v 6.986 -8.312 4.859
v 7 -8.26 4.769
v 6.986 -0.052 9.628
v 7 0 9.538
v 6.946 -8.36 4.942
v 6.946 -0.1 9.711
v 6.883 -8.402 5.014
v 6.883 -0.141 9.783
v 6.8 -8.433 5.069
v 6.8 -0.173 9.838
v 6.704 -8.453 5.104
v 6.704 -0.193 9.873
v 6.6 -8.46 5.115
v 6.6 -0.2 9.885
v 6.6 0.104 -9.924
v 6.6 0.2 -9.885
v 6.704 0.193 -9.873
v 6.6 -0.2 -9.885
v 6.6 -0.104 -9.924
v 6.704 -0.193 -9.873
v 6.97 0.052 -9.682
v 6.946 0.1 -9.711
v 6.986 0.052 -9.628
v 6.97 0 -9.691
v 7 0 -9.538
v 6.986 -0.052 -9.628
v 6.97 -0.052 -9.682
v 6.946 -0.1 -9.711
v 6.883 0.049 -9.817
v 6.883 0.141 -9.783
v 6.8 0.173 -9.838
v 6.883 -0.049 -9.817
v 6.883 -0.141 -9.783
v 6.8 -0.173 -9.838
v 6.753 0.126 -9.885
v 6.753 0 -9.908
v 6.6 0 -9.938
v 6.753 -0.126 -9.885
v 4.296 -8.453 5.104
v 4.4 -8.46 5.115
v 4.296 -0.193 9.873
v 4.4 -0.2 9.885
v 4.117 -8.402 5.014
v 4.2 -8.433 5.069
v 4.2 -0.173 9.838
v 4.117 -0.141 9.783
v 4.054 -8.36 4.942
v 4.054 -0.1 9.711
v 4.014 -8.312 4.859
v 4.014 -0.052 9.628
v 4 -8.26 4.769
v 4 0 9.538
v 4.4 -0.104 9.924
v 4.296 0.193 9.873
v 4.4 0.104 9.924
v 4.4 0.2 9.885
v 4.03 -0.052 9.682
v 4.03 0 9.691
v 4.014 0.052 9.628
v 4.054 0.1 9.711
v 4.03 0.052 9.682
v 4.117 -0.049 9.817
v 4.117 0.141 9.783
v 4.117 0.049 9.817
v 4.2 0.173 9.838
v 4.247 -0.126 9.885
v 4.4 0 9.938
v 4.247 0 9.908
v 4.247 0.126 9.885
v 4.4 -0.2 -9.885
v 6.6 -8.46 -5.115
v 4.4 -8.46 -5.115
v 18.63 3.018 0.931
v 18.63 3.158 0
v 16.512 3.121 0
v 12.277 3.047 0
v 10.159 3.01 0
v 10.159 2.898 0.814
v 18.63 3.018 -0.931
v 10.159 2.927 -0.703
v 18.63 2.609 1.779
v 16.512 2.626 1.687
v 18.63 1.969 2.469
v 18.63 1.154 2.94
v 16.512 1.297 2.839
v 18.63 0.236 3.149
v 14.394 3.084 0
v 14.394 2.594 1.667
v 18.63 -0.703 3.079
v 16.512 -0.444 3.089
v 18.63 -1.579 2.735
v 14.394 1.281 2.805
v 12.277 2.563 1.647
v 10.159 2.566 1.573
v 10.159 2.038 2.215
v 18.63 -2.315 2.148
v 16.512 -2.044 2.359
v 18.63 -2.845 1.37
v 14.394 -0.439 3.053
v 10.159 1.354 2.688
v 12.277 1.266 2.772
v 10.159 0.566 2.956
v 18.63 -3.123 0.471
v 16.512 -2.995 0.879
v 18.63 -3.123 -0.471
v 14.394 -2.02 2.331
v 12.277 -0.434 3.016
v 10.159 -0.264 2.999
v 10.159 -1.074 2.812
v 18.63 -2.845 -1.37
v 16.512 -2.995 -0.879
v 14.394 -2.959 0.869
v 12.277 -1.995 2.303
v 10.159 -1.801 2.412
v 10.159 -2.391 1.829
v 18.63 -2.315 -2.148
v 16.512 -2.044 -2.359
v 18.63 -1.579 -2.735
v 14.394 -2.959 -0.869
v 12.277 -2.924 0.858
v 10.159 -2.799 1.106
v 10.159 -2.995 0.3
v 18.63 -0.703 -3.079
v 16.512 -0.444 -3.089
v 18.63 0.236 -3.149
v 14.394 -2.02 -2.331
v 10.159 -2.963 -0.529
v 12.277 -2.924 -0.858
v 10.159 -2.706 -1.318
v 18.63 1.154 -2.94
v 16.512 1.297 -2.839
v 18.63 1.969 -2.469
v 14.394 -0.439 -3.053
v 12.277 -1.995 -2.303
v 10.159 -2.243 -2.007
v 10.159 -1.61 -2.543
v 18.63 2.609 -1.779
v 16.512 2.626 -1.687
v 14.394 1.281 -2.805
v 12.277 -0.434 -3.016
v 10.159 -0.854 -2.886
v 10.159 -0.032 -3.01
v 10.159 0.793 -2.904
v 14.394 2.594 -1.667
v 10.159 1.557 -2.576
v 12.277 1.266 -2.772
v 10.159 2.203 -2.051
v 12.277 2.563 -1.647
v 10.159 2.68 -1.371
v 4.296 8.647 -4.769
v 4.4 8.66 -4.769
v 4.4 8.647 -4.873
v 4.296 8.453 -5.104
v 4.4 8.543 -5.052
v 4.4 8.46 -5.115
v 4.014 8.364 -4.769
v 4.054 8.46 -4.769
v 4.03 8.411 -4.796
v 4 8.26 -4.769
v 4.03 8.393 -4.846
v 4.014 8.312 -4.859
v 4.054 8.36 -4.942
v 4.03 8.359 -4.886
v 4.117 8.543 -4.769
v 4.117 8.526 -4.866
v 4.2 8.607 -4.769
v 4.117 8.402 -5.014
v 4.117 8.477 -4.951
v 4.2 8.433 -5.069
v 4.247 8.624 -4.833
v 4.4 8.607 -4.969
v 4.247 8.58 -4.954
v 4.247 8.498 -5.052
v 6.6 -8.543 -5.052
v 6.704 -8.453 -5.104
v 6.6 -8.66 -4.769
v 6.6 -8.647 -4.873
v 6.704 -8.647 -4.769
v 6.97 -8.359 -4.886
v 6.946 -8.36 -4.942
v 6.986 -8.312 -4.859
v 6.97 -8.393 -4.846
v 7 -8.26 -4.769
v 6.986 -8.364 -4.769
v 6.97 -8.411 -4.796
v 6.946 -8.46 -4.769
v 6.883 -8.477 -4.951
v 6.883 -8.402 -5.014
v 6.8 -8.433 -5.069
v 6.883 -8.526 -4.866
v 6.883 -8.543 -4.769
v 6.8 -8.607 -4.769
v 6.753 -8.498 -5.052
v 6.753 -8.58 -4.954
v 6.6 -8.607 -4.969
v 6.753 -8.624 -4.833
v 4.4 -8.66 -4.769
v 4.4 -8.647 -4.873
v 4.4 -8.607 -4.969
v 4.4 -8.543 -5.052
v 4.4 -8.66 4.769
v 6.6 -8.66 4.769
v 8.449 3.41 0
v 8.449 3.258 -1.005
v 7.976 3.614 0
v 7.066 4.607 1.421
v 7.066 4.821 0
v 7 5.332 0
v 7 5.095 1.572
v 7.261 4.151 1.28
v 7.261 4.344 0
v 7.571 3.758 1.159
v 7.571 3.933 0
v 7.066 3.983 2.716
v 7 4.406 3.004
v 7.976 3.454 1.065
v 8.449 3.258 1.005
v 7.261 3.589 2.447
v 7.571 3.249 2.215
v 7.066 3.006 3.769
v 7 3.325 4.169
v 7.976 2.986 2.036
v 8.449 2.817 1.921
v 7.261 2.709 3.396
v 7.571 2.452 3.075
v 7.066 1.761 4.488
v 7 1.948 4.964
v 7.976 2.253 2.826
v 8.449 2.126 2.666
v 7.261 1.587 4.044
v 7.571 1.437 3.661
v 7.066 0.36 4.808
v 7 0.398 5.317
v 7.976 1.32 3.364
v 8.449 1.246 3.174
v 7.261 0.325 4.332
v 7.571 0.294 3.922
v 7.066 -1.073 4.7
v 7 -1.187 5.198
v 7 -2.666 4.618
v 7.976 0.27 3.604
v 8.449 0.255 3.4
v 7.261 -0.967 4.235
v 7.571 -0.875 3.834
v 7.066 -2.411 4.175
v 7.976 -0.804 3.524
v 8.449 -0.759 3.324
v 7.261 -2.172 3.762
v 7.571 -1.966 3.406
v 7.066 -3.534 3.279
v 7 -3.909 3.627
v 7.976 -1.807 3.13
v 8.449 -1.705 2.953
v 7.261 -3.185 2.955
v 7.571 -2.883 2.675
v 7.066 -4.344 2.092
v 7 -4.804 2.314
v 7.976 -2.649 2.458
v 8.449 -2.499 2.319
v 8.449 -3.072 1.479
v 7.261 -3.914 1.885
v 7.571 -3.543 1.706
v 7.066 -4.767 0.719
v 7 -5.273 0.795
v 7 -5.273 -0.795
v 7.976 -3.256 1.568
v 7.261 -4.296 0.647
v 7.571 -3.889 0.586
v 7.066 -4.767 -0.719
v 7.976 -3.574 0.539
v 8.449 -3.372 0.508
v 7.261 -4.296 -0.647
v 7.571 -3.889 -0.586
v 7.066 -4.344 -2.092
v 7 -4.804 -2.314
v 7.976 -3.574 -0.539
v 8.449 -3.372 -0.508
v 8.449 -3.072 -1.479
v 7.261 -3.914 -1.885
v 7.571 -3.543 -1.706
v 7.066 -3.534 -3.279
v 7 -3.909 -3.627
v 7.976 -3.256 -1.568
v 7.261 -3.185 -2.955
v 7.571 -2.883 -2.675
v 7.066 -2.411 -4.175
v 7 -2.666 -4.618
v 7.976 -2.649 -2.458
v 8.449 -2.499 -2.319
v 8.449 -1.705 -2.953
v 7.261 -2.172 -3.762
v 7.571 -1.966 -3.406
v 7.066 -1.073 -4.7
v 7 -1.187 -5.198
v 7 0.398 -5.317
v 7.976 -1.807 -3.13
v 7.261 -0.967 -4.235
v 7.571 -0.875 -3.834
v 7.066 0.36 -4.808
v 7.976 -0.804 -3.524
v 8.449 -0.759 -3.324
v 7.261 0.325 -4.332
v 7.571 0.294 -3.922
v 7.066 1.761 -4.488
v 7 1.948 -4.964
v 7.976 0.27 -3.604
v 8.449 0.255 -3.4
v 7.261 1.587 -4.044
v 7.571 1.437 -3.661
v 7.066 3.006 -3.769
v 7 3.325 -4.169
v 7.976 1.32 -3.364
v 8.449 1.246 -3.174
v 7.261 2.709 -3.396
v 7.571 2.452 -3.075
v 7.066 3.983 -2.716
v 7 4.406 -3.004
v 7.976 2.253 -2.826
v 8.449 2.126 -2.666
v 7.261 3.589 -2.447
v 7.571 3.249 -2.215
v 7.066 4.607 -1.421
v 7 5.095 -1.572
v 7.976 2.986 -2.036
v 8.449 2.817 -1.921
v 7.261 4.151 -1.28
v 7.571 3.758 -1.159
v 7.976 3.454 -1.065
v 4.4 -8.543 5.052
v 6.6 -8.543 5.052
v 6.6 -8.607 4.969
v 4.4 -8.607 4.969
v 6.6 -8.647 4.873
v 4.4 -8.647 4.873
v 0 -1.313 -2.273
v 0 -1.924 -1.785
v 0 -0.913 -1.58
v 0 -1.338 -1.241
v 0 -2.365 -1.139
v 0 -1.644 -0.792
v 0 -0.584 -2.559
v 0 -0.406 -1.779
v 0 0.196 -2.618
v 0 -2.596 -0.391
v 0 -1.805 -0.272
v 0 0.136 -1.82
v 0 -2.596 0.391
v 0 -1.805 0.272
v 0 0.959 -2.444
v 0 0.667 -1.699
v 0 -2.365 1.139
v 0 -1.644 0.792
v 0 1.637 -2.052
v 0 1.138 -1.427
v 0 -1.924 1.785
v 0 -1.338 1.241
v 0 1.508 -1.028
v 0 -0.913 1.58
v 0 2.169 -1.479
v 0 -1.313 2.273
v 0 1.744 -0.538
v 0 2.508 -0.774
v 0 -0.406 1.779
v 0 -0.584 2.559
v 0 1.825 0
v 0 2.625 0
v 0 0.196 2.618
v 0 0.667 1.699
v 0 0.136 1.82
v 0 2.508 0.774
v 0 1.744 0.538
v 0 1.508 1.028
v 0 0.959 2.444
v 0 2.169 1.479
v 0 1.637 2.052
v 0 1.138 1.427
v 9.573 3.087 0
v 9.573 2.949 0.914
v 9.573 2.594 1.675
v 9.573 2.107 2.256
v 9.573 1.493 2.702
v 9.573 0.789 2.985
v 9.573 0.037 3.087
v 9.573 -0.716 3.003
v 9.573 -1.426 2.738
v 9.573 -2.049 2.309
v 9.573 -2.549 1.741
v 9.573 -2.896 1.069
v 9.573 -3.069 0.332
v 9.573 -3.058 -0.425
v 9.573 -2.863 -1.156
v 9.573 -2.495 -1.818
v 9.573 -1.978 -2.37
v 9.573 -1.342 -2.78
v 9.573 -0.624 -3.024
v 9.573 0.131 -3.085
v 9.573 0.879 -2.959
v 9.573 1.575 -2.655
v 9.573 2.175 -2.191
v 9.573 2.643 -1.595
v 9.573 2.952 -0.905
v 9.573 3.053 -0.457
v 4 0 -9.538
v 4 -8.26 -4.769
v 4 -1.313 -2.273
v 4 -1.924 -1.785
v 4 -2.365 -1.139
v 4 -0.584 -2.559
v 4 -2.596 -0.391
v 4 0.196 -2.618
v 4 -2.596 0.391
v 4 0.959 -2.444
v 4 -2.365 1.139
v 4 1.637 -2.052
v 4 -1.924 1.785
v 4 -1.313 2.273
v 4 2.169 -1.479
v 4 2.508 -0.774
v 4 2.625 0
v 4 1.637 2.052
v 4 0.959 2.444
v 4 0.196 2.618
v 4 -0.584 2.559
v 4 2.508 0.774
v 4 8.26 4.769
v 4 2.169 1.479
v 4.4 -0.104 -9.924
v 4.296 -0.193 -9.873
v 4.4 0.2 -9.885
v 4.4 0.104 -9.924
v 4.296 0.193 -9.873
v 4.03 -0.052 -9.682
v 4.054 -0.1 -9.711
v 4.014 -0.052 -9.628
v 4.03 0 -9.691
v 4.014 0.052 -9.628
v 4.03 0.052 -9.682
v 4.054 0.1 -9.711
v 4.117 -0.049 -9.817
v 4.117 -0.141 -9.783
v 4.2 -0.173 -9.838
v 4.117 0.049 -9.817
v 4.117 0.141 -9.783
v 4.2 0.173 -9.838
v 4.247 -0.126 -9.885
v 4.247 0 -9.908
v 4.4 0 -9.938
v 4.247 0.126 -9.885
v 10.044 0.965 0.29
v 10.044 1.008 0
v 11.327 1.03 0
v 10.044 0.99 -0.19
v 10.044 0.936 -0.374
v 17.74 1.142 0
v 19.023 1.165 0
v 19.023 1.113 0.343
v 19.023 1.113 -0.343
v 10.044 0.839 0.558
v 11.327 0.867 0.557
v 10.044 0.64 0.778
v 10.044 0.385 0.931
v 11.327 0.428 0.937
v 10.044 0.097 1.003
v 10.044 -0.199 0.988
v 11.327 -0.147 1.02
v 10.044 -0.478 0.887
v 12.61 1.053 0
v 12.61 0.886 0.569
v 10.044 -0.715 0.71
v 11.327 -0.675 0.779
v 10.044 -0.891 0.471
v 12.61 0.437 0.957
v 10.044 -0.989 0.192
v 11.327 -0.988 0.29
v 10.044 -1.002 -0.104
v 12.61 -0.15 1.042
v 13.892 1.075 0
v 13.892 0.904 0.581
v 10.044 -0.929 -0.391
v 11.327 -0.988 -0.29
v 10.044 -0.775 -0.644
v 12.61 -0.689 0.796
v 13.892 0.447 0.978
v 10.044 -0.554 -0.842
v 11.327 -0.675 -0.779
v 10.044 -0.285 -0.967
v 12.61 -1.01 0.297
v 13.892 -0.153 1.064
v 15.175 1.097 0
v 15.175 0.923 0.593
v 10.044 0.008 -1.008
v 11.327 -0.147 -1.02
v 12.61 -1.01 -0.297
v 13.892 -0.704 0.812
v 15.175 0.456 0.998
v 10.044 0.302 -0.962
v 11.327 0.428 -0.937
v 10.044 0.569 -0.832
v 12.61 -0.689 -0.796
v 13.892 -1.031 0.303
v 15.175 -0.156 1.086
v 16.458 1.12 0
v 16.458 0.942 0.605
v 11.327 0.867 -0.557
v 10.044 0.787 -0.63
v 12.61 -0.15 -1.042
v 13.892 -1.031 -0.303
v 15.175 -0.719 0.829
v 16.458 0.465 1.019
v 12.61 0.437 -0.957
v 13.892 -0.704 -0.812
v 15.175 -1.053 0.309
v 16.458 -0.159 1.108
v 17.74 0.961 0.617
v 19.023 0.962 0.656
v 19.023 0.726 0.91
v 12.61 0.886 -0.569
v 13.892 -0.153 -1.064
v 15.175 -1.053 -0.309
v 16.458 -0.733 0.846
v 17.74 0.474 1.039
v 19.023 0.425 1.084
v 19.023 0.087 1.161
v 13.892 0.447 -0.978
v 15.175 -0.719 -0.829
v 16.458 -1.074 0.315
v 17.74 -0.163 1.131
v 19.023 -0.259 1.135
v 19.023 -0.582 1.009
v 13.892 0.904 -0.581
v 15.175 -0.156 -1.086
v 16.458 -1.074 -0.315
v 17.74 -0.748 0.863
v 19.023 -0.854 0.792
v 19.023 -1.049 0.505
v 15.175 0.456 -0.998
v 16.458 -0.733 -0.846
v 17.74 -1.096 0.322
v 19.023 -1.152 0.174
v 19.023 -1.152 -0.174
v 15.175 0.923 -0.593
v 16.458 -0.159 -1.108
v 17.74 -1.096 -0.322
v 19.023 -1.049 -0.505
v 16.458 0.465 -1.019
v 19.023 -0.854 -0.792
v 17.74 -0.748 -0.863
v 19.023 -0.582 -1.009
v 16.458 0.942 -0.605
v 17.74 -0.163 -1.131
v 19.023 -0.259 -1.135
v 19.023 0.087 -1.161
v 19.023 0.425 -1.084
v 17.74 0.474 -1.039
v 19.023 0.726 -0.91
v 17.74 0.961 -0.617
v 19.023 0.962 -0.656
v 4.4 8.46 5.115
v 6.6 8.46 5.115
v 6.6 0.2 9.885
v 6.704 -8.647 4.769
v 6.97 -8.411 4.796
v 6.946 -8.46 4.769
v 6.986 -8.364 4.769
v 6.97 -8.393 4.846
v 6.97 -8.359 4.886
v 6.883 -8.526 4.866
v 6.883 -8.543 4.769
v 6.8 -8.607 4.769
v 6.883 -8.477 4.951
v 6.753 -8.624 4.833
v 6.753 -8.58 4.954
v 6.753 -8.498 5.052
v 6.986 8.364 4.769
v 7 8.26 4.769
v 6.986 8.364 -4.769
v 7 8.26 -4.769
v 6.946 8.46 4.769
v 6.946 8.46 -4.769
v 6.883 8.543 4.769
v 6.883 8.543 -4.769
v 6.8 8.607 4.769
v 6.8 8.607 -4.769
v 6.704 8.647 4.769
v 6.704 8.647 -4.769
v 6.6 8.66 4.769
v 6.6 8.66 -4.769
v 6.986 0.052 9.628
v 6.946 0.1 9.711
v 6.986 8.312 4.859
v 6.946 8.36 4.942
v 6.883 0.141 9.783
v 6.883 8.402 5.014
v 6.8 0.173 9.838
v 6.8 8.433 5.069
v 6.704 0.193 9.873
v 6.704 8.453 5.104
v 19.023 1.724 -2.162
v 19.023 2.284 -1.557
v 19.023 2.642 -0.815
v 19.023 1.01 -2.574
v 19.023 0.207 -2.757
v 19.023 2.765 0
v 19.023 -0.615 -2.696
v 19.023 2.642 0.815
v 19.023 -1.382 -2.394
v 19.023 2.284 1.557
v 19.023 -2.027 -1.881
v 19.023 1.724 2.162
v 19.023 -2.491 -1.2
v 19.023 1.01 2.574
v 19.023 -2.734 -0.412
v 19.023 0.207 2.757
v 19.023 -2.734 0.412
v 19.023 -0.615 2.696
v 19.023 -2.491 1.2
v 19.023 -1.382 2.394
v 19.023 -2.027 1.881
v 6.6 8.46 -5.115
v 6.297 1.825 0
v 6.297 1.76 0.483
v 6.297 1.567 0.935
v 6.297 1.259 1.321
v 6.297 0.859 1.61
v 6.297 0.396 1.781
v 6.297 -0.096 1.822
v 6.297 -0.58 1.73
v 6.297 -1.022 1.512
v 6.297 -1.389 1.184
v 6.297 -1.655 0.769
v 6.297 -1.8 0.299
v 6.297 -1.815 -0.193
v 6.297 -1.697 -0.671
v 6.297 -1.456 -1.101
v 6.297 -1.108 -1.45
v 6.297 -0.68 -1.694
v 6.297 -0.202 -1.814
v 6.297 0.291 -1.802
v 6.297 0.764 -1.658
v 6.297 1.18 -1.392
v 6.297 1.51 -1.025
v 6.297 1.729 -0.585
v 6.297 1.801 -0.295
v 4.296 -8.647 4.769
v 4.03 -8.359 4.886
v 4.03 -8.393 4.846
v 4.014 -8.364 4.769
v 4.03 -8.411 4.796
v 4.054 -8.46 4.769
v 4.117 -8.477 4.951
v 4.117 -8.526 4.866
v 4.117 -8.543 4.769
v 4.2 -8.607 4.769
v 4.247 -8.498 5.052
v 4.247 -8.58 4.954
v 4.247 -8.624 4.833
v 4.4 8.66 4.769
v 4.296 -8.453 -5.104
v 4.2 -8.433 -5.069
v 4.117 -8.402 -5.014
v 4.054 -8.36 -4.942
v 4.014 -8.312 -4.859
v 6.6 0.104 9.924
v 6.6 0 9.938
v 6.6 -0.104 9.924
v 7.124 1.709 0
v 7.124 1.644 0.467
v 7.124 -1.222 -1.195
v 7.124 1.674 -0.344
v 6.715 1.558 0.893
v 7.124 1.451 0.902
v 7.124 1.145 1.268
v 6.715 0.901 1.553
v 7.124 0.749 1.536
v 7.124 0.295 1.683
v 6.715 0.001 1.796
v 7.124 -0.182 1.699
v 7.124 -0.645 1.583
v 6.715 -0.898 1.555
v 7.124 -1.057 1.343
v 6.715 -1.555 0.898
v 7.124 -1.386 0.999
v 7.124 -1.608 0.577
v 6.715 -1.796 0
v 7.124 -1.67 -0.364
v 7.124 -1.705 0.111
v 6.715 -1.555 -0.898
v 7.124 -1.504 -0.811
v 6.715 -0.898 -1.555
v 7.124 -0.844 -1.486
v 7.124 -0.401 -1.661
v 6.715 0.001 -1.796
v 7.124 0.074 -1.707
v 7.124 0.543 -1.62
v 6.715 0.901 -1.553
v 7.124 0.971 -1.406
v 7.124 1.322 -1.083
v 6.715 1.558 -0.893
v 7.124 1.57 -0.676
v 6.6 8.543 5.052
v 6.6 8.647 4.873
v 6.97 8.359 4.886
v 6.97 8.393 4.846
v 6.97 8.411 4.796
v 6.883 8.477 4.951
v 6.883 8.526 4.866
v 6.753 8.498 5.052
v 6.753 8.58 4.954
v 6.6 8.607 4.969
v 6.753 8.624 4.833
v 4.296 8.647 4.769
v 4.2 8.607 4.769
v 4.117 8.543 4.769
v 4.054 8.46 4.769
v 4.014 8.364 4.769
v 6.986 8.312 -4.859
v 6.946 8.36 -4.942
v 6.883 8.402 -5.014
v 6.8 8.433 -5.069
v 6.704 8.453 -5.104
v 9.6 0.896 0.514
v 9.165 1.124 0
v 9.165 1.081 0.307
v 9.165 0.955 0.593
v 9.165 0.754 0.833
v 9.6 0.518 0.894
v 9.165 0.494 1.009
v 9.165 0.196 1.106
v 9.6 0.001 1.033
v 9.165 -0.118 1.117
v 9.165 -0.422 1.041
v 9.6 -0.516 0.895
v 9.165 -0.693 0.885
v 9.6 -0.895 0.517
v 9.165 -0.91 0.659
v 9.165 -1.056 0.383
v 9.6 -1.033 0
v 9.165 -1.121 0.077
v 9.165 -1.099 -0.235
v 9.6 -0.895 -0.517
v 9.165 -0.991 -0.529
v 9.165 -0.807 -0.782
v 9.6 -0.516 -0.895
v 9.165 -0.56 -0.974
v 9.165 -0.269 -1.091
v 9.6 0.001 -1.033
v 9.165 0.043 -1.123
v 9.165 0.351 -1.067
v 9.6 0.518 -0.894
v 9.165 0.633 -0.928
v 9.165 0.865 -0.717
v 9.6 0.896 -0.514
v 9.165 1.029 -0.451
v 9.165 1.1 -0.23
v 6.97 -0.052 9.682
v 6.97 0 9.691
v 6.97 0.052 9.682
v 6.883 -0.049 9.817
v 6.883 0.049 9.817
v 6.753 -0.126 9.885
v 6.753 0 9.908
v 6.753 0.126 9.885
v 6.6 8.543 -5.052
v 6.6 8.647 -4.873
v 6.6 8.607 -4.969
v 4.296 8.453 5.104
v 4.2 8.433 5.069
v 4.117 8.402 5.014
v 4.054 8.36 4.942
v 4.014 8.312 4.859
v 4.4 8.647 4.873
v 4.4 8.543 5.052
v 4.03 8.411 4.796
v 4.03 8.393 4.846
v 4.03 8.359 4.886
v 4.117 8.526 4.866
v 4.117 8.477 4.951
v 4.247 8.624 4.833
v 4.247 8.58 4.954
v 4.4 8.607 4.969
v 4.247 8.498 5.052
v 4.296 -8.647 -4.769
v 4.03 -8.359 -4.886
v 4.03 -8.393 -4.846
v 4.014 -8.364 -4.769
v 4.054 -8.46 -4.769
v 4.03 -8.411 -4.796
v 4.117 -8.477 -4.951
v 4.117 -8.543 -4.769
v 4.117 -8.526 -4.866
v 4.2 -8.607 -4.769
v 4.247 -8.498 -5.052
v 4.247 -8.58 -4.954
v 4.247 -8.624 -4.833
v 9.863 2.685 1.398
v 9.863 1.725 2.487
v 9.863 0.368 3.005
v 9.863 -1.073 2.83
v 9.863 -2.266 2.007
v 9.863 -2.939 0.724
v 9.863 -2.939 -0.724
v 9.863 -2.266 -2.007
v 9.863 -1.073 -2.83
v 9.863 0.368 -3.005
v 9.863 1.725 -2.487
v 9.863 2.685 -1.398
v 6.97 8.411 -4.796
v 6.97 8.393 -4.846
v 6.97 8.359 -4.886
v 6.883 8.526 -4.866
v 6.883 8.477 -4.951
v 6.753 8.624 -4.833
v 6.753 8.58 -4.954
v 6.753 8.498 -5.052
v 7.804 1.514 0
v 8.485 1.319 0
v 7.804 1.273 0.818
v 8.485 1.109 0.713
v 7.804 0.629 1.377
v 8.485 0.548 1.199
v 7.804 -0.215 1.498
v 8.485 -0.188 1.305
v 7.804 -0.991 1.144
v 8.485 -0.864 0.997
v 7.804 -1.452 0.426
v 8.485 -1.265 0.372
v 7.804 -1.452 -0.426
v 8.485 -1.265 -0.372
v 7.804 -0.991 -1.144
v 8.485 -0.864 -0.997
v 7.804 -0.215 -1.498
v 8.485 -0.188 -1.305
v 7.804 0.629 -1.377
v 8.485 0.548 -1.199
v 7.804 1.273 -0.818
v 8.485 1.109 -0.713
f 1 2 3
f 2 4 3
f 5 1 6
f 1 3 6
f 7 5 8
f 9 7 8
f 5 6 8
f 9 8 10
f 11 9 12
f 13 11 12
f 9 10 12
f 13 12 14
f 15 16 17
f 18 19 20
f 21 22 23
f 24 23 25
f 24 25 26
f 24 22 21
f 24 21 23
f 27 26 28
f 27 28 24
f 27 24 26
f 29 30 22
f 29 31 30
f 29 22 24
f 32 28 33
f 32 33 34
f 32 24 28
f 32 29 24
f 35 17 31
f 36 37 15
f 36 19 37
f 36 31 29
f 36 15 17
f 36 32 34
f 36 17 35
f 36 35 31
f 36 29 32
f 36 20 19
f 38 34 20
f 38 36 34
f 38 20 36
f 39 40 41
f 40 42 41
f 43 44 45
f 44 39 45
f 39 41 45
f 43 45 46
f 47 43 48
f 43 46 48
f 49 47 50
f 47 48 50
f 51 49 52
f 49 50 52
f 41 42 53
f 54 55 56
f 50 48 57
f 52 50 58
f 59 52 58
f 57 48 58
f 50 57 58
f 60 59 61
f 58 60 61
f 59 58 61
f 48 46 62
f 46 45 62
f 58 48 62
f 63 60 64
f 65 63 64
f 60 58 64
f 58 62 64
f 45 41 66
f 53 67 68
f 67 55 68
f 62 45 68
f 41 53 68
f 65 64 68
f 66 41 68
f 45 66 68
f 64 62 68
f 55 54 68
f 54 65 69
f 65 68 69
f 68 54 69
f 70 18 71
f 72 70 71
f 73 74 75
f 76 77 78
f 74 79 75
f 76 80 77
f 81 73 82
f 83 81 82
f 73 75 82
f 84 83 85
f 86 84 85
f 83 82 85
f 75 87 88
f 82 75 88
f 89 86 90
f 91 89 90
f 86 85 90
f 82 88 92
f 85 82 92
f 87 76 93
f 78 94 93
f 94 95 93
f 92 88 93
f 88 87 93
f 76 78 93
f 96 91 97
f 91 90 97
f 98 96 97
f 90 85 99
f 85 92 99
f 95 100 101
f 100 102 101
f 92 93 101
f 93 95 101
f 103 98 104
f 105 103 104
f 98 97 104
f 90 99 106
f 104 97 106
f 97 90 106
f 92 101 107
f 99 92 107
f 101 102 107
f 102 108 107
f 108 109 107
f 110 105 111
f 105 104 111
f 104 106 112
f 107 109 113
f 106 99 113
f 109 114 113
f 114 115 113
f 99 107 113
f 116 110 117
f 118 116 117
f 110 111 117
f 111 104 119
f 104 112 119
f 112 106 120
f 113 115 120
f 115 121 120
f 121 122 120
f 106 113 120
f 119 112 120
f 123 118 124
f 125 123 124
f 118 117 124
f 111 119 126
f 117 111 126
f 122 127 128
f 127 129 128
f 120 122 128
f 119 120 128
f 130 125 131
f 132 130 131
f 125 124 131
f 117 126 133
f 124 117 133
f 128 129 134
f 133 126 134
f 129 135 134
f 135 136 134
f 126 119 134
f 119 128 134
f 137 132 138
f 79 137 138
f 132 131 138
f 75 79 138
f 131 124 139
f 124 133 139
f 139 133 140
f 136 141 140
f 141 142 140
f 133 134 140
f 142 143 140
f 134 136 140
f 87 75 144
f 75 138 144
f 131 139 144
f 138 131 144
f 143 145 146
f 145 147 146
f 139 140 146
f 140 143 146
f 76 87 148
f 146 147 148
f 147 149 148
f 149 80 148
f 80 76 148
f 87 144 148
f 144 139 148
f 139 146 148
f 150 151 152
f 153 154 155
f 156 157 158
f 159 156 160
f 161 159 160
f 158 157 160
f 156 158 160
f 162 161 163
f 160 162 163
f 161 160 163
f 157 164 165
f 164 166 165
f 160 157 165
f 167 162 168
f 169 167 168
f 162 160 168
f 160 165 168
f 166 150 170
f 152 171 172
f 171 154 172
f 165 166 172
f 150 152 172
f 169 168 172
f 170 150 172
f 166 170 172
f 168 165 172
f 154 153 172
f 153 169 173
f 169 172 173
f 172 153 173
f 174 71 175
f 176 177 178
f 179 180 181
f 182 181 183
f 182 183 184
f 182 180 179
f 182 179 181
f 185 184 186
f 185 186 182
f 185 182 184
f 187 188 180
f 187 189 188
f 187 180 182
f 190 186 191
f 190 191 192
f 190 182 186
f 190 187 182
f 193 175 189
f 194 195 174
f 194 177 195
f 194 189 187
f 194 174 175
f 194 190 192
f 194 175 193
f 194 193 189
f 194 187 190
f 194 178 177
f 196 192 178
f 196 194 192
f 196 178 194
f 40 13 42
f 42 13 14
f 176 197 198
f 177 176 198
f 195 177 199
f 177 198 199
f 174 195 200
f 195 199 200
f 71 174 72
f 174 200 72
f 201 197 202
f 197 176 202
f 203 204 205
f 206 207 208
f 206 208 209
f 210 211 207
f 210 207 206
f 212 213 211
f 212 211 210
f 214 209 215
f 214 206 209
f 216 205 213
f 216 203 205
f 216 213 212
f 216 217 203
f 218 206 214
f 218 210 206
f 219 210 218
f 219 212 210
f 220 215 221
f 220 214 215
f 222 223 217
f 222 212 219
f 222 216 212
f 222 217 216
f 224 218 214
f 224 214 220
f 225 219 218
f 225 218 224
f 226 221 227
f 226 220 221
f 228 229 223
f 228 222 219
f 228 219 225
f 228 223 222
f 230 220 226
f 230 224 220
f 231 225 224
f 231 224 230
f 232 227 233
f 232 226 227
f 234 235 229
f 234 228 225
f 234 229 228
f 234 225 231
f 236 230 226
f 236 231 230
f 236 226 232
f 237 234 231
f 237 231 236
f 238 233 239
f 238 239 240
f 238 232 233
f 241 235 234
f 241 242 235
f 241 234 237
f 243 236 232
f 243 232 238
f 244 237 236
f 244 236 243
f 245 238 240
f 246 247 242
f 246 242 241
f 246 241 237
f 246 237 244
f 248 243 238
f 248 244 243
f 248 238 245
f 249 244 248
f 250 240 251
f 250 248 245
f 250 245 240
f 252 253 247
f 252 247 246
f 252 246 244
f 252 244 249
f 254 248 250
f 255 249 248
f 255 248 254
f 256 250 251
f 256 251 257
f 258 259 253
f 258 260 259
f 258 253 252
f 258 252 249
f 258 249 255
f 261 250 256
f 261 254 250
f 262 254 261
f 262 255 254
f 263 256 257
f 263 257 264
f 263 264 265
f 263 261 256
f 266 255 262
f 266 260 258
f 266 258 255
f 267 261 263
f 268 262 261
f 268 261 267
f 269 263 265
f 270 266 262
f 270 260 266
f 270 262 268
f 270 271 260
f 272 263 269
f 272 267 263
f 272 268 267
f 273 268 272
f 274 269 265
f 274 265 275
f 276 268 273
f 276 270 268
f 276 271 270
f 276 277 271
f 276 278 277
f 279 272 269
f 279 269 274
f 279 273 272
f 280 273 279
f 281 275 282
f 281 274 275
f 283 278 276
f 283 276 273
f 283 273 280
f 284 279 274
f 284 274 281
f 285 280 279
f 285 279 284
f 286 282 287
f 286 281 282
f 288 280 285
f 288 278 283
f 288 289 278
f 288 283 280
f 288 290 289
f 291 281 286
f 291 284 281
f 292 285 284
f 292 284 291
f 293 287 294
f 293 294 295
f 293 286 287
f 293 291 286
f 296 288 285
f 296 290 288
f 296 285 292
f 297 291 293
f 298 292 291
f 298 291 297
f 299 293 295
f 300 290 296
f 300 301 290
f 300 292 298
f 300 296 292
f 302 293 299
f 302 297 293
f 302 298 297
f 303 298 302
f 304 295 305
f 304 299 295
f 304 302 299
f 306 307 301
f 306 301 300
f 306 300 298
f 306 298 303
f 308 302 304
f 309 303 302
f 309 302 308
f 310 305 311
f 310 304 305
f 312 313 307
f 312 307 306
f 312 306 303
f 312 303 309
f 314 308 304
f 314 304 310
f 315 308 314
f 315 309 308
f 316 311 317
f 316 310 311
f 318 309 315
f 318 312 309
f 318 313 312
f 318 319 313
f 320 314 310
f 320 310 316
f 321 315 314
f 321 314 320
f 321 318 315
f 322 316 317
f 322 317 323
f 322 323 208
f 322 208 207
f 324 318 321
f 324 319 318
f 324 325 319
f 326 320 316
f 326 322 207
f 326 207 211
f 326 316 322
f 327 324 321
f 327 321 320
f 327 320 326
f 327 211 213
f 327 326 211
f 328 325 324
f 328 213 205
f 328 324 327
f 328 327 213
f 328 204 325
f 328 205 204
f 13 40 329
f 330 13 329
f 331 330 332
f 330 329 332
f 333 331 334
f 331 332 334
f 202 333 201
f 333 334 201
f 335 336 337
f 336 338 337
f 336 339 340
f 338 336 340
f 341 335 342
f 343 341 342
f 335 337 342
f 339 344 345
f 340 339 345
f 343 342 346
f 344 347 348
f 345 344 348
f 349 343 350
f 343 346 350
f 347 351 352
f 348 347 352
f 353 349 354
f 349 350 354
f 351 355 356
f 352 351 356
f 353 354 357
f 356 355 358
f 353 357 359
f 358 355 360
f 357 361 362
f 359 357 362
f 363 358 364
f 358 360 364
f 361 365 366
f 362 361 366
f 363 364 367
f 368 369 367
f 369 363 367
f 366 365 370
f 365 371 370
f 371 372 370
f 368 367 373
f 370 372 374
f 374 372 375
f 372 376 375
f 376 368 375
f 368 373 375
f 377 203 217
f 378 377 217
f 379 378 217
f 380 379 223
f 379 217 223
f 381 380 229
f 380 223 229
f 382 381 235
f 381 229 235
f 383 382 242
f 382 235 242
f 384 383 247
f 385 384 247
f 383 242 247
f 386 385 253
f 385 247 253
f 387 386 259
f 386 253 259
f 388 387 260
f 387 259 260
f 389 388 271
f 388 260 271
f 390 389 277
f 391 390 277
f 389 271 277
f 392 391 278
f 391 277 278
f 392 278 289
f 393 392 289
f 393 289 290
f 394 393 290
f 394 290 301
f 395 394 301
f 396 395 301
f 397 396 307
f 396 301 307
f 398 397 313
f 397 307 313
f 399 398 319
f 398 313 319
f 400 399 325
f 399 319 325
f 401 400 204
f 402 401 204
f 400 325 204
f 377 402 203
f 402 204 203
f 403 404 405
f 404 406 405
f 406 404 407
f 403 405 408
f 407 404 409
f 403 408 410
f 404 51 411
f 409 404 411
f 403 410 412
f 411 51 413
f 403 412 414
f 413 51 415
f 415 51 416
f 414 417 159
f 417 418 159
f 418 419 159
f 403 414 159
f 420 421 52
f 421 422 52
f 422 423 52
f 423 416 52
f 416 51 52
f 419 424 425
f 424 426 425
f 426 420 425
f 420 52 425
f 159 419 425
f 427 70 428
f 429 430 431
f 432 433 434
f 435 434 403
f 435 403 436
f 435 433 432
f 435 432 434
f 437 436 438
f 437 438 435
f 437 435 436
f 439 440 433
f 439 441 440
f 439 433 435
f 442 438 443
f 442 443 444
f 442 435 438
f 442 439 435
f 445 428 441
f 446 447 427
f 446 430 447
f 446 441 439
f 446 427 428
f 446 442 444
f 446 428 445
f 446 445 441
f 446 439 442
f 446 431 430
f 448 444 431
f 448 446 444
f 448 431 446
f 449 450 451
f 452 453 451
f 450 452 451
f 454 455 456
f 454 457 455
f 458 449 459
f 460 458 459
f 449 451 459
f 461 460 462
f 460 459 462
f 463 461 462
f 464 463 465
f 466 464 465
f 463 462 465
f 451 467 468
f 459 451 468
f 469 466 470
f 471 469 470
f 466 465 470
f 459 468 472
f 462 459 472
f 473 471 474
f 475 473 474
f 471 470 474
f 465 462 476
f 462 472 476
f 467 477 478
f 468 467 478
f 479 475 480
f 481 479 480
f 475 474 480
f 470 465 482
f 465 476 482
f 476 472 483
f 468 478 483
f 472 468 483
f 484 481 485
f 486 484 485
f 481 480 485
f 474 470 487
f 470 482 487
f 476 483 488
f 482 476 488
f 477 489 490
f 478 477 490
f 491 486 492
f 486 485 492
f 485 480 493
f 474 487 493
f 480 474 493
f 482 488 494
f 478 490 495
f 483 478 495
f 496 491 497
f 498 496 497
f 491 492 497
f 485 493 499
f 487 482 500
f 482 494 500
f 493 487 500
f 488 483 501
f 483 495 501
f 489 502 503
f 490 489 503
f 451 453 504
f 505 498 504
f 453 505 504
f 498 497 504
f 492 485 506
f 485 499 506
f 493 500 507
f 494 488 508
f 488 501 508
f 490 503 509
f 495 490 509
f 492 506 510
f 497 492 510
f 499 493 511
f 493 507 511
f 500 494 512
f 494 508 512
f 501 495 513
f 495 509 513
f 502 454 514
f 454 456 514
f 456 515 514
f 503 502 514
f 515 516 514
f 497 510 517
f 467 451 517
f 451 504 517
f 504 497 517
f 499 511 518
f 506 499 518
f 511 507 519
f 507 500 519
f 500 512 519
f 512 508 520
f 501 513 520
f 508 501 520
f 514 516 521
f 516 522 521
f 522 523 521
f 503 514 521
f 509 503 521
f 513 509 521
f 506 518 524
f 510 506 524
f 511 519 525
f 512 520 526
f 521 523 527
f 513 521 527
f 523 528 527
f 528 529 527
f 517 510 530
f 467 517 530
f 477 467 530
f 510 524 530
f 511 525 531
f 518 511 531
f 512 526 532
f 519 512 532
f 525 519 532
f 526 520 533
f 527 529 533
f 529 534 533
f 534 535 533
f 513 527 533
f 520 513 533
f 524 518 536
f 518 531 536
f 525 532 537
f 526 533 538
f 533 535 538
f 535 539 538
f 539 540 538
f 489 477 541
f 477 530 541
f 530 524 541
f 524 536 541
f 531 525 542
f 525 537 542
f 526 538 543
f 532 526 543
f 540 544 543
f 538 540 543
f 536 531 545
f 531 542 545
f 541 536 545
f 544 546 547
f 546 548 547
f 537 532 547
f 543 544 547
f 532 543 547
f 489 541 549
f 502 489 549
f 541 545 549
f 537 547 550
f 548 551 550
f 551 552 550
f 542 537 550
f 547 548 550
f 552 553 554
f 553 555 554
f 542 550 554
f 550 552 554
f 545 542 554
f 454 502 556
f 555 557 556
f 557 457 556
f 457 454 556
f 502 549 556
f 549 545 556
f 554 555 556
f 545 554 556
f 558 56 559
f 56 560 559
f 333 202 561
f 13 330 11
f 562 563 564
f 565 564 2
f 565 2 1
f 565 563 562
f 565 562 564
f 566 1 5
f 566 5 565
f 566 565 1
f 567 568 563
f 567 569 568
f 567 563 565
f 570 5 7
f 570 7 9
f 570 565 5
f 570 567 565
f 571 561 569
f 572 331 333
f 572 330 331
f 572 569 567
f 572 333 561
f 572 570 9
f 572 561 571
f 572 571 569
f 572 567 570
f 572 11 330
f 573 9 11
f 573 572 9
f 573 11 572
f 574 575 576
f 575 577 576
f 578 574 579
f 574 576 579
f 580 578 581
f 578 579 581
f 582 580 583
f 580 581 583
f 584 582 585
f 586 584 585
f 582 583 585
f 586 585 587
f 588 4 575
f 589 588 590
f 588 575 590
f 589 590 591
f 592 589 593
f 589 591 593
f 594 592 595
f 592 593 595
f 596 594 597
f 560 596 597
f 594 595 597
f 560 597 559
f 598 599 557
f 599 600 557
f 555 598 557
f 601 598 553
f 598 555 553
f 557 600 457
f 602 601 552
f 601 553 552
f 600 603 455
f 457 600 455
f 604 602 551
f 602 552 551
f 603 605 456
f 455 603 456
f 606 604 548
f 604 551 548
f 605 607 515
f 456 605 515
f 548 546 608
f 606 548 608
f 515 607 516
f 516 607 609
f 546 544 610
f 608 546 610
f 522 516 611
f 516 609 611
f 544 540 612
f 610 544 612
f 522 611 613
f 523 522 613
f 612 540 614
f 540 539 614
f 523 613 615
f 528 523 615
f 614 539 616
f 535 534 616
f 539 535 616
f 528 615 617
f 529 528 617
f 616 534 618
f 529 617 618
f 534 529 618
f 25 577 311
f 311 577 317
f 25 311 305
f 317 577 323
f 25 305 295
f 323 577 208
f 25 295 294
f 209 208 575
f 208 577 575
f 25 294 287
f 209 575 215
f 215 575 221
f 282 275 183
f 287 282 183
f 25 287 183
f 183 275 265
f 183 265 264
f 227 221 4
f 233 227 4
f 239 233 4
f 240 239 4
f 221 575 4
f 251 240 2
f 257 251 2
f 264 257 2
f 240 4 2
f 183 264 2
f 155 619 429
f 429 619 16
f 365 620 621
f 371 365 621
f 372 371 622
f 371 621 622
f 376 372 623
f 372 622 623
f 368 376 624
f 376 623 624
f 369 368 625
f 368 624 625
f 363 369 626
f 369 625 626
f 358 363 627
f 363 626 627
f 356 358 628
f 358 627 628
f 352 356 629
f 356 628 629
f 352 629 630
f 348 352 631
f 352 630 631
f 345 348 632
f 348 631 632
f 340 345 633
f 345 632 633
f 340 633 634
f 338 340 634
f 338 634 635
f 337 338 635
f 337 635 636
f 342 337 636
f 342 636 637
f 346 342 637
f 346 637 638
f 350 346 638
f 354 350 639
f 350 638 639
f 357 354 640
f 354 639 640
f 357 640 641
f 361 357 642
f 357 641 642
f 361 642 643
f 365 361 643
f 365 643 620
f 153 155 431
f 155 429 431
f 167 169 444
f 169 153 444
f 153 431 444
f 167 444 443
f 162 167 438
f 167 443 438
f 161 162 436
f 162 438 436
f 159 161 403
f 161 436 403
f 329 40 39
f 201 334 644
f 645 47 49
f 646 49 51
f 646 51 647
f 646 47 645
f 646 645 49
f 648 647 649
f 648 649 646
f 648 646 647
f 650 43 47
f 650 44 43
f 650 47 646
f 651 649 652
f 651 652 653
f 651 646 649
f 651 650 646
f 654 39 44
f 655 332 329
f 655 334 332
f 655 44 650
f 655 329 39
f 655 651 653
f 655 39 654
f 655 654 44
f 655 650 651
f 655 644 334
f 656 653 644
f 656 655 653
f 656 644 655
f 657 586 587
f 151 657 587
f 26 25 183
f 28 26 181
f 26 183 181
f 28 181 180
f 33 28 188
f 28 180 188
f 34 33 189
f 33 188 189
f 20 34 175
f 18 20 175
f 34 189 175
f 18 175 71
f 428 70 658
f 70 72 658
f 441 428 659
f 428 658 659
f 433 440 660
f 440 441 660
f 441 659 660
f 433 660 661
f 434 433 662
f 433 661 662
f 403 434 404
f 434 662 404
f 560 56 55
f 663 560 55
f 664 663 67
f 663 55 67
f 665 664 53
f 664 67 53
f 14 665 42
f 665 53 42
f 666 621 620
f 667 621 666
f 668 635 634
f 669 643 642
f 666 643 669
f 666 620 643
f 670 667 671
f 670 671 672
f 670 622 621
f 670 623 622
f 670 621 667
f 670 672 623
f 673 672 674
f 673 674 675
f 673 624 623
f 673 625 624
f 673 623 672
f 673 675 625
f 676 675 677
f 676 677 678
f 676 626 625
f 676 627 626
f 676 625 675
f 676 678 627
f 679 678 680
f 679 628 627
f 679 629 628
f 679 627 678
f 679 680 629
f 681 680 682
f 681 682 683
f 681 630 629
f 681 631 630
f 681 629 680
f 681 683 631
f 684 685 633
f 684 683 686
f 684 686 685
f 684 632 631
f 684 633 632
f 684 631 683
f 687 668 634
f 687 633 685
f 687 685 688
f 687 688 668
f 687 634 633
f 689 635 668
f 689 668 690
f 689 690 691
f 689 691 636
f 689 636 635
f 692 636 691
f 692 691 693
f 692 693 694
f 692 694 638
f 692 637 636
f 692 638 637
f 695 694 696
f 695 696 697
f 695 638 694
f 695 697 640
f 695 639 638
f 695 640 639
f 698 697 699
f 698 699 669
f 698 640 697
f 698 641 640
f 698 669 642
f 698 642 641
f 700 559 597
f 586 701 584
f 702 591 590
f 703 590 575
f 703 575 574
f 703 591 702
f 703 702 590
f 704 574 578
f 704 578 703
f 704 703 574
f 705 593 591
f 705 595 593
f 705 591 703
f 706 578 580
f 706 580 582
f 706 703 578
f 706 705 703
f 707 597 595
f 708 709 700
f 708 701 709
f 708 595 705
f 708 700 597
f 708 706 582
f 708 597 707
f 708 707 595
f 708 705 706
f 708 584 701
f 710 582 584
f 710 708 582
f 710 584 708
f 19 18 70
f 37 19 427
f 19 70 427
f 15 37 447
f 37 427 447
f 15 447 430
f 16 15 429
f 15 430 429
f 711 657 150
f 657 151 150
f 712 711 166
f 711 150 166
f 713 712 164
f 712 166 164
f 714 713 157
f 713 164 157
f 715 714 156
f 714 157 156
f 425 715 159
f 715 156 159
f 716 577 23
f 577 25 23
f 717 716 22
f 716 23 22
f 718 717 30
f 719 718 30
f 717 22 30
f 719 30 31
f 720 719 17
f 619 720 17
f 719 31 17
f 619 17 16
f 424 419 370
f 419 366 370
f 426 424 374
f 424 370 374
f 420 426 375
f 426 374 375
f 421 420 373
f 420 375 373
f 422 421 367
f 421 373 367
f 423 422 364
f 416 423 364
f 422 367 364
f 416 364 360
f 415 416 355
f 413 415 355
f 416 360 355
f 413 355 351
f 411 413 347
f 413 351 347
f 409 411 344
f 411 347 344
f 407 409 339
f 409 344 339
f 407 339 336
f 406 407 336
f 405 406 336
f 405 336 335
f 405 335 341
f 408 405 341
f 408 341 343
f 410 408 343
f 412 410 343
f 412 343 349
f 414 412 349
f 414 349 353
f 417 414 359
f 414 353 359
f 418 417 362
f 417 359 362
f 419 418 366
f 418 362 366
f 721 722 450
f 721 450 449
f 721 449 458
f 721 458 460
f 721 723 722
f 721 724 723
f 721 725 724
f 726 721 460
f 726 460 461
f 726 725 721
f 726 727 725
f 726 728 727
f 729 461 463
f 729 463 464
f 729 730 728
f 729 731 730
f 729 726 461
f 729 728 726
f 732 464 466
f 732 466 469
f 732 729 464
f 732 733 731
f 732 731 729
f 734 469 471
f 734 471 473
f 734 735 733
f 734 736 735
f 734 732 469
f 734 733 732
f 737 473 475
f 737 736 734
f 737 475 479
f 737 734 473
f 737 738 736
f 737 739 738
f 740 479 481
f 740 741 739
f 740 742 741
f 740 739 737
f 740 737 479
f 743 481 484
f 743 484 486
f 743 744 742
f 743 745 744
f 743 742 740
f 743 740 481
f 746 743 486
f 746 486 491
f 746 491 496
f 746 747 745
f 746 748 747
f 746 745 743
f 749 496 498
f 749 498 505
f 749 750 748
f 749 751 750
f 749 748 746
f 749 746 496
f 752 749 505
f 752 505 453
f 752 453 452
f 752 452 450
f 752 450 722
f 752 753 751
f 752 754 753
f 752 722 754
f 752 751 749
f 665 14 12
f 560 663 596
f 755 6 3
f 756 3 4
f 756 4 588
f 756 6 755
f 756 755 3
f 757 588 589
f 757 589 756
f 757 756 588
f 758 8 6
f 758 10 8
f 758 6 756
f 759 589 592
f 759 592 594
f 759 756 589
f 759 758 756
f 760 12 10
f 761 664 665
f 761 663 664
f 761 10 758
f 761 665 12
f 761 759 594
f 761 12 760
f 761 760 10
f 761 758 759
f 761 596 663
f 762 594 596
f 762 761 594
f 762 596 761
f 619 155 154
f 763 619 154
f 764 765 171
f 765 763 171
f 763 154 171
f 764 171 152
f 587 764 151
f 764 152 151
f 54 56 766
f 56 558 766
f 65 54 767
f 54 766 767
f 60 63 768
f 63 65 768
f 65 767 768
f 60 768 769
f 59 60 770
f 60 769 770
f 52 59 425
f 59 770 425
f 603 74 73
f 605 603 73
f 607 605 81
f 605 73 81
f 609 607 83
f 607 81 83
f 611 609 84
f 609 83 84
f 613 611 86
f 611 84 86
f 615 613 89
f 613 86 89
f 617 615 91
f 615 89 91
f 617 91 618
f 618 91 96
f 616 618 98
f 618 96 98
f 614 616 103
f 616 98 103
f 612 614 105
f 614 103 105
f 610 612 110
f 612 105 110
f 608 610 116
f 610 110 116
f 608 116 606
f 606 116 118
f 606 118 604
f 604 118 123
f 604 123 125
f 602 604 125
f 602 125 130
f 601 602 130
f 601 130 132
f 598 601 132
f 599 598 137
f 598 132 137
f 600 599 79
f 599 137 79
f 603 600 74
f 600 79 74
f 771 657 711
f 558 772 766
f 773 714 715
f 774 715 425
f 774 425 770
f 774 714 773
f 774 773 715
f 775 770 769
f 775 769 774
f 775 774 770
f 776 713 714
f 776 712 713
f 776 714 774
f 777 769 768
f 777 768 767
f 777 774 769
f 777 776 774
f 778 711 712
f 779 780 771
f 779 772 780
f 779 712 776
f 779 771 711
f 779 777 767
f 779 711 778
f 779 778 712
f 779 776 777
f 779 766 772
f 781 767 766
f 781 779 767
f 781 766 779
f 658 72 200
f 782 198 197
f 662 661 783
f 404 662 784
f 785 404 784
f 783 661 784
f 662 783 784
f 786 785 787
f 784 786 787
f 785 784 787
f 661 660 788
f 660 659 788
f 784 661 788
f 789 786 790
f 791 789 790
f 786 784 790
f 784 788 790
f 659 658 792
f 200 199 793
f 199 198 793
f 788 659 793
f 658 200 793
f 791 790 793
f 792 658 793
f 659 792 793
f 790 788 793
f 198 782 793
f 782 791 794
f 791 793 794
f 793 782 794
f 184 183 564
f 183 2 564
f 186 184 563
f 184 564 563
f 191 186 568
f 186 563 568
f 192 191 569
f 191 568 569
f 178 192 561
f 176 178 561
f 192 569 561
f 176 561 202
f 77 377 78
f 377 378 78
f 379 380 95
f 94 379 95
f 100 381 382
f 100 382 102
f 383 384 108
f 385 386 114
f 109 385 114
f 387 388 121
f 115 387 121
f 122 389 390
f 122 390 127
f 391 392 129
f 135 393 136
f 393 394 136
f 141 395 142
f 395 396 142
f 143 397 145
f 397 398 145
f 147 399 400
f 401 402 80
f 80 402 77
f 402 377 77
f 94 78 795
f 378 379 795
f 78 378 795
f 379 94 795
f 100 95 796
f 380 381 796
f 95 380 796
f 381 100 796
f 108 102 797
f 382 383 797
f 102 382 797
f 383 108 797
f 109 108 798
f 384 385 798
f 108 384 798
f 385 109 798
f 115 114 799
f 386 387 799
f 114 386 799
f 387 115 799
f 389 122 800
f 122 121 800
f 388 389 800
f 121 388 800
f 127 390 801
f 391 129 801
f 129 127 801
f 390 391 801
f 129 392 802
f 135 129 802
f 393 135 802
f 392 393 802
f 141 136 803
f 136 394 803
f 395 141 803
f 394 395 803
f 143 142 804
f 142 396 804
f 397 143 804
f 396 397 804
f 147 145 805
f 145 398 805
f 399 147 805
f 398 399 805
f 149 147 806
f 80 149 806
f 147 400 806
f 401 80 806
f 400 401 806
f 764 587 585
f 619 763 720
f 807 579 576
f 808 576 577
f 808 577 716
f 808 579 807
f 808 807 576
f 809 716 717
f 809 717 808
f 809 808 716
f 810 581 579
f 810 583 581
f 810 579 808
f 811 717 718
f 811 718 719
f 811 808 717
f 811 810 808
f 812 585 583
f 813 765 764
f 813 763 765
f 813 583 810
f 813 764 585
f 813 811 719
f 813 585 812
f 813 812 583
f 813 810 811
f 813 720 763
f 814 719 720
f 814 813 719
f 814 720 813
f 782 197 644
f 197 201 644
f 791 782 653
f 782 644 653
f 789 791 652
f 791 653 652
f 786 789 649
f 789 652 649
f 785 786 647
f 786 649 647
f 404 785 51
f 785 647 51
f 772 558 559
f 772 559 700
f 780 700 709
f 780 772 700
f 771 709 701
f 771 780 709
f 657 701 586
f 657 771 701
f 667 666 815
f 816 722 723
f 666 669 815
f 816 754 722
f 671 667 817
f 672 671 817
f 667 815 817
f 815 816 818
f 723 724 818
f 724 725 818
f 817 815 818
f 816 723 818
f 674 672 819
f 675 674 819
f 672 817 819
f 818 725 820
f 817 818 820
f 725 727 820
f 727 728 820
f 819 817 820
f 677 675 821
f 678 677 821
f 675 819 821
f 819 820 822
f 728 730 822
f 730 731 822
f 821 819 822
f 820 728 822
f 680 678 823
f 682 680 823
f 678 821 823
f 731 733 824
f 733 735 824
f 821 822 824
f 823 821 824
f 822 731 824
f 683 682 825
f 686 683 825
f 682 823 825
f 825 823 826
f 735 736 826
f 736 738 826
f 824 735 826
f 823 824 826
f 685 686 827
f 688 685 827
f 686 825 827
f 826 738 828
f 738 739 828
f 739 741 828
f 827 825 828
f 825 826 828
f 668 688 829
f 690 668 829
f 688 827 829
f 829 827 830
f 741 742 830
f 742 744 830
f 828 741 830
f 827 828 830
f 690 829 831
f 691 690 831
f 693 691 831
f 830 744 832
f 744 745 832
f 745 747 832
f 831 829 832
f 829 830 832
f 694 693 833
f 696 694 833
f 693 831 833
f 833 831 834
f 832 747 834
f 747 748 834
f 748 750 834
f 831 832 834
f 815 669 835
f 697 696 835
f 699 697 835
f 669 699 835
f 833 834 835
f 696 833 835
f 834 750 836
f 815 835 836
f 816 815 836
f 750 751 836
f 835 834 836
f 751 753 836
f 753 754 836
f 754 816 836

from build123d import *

# Parameters (mm, degrees)
FILLET4_R               = 3
CHAMFER1_SIZE2          = 0.393197641
CHAMFER1_SIZE           = 0.4
CUT_EXTRUDE1_DEPTH      = 13.023098533
CUT_EXTRUDE1_DEPTH_BACK = 8.0000001
FILLET5_R               = 0.4
FILLET6_R               = 2


with BuildPart() as part:
    # Sketch1 → Revolve1 (revolve)
    with BuildSketch(Plane.XY):
        Polygon((0, 1.825), (6.718918331, 1.825), (9.596035247, 1), (19.023098433, 1.16455), (19.023098433, 3.164854656), (9.859986912, 3.00491195), (7, 3.825), (7, 10), (4, 10), (4, 2.625), (0, 2.625), align=None)
    revolve(axis=Axis((0, 0, 0), (1, 0, 0)))

    # Fillet4
    fillet4_edges = [part.edges().sort_by_distance(p)[0] for p in [
        (9.596035247, -1, 0),
        (6.718918331, -1.825, 0),
    ]]
    fillet(fillet4_edges, radius=FILLET4_R)

    # Chamfer1
    chamfer1_edges = [part.edges().sort_by_distance(p)[0] for p in [
        (19.023098433, -3.164854656, 0),
    ]]
    chamfer(chamfer1_edges, length=CHAMFER1_SIZE, length2=CHAMFER1_SIZE2)

    # Sketch2 → Cut-Extrude1 (cut, two sides)
    with BuildSketch(Plane(origin=(7, 0, 0), x_dir=(0, 0, -1), z_dir=(1, 0, 0))) as cut_extrude1_sk:
        with BuildLine():
            Line((-10, 0), (-5, 8.660254038))
            ThreePointArc((-5, 8.660254038), (-8.660254038, 5), (-10, 0))
        make_face()
        with BuildLine():
            Line((-5, 8.660254038), (5, 8.660254038))
            ThreePointArc((5, 8.660254038), (0, 10), (-5, 8.660254038))
        make_face()
        with BuildLine():
            Line((5, 8.660254038), (10, 0))
            ThreePointArc((10, 0), (8.660254038, 5), (5, 8.660254038))
        make_face()
        with BuildLine():
            ThreePointArc((-10, 0), (-8.660254038, -5), (-5, -8.660254038))
            Line((-5, -8.660254038), (-10, 0))
        make_face()
        with BuildLine():
            ThreePointArc((-5, -8.660254038), (0, -10), (5, -8.660254038))
            Line((5, -8.660254038), (-5, -8.660254038))
        make_face()
        with BuildLine():
            ThreePointArc((5, -8.660254038), (8.660254038, -5), (10, 0))
            Line((10, 0), (5, -8.660254038))
        make_face()
    extrude(amount=CUT_EXTRUDE1_DEPTH, mode=Mode.SUBTRACT)
    extrude(cut_extrude1_sk.sketch, amount=-CUT_EXTRUDE1_DEPTH_BACK, mode=Mode.SUBTRACT)

    # Fillet5
    fillet5_edges = [part.edges().sort_by_distance(p)[0] for p in [
        (7, -4.330127019, -7.5),
        (4, -4.330127019, -7.5),
        (4, -8.660254038, 0),
        (4, 4.330127019, -7.5),
        (4, 4.330127019, 7.5),
        (5.5, 8.660254038, 5),
        (7, 4.330127019, 7.5),
        (5.5, 0, 10),
        (5.5, 0, -10),
        (7, 4.330127019, -7.5),
        (5.5, 8.660254038, -5),
        (5.5, -8.660254038, 5),
        (7, -8.660254038, 0),
        (5.5, -8.660254038, -5),
        (7, 8.660254038, 0),
        (4, 8.660254038, 0),
        (7, -4.330127019, 7.5),
        (4, -4.330127019, 7.5),
    ]]
    fillet(fillet5_edges, radius=FILLET5_R)

    # Fillet6
    fillet6_edges = [part.edges().sort_by_distance(p)[0] for p in [
        (7, -3.825, 0),
        (9.859986912, -3.00491195, 0),
    ]]
    fillet(fillet6_edges, radius=FILLET6_R)


solid = part.part
